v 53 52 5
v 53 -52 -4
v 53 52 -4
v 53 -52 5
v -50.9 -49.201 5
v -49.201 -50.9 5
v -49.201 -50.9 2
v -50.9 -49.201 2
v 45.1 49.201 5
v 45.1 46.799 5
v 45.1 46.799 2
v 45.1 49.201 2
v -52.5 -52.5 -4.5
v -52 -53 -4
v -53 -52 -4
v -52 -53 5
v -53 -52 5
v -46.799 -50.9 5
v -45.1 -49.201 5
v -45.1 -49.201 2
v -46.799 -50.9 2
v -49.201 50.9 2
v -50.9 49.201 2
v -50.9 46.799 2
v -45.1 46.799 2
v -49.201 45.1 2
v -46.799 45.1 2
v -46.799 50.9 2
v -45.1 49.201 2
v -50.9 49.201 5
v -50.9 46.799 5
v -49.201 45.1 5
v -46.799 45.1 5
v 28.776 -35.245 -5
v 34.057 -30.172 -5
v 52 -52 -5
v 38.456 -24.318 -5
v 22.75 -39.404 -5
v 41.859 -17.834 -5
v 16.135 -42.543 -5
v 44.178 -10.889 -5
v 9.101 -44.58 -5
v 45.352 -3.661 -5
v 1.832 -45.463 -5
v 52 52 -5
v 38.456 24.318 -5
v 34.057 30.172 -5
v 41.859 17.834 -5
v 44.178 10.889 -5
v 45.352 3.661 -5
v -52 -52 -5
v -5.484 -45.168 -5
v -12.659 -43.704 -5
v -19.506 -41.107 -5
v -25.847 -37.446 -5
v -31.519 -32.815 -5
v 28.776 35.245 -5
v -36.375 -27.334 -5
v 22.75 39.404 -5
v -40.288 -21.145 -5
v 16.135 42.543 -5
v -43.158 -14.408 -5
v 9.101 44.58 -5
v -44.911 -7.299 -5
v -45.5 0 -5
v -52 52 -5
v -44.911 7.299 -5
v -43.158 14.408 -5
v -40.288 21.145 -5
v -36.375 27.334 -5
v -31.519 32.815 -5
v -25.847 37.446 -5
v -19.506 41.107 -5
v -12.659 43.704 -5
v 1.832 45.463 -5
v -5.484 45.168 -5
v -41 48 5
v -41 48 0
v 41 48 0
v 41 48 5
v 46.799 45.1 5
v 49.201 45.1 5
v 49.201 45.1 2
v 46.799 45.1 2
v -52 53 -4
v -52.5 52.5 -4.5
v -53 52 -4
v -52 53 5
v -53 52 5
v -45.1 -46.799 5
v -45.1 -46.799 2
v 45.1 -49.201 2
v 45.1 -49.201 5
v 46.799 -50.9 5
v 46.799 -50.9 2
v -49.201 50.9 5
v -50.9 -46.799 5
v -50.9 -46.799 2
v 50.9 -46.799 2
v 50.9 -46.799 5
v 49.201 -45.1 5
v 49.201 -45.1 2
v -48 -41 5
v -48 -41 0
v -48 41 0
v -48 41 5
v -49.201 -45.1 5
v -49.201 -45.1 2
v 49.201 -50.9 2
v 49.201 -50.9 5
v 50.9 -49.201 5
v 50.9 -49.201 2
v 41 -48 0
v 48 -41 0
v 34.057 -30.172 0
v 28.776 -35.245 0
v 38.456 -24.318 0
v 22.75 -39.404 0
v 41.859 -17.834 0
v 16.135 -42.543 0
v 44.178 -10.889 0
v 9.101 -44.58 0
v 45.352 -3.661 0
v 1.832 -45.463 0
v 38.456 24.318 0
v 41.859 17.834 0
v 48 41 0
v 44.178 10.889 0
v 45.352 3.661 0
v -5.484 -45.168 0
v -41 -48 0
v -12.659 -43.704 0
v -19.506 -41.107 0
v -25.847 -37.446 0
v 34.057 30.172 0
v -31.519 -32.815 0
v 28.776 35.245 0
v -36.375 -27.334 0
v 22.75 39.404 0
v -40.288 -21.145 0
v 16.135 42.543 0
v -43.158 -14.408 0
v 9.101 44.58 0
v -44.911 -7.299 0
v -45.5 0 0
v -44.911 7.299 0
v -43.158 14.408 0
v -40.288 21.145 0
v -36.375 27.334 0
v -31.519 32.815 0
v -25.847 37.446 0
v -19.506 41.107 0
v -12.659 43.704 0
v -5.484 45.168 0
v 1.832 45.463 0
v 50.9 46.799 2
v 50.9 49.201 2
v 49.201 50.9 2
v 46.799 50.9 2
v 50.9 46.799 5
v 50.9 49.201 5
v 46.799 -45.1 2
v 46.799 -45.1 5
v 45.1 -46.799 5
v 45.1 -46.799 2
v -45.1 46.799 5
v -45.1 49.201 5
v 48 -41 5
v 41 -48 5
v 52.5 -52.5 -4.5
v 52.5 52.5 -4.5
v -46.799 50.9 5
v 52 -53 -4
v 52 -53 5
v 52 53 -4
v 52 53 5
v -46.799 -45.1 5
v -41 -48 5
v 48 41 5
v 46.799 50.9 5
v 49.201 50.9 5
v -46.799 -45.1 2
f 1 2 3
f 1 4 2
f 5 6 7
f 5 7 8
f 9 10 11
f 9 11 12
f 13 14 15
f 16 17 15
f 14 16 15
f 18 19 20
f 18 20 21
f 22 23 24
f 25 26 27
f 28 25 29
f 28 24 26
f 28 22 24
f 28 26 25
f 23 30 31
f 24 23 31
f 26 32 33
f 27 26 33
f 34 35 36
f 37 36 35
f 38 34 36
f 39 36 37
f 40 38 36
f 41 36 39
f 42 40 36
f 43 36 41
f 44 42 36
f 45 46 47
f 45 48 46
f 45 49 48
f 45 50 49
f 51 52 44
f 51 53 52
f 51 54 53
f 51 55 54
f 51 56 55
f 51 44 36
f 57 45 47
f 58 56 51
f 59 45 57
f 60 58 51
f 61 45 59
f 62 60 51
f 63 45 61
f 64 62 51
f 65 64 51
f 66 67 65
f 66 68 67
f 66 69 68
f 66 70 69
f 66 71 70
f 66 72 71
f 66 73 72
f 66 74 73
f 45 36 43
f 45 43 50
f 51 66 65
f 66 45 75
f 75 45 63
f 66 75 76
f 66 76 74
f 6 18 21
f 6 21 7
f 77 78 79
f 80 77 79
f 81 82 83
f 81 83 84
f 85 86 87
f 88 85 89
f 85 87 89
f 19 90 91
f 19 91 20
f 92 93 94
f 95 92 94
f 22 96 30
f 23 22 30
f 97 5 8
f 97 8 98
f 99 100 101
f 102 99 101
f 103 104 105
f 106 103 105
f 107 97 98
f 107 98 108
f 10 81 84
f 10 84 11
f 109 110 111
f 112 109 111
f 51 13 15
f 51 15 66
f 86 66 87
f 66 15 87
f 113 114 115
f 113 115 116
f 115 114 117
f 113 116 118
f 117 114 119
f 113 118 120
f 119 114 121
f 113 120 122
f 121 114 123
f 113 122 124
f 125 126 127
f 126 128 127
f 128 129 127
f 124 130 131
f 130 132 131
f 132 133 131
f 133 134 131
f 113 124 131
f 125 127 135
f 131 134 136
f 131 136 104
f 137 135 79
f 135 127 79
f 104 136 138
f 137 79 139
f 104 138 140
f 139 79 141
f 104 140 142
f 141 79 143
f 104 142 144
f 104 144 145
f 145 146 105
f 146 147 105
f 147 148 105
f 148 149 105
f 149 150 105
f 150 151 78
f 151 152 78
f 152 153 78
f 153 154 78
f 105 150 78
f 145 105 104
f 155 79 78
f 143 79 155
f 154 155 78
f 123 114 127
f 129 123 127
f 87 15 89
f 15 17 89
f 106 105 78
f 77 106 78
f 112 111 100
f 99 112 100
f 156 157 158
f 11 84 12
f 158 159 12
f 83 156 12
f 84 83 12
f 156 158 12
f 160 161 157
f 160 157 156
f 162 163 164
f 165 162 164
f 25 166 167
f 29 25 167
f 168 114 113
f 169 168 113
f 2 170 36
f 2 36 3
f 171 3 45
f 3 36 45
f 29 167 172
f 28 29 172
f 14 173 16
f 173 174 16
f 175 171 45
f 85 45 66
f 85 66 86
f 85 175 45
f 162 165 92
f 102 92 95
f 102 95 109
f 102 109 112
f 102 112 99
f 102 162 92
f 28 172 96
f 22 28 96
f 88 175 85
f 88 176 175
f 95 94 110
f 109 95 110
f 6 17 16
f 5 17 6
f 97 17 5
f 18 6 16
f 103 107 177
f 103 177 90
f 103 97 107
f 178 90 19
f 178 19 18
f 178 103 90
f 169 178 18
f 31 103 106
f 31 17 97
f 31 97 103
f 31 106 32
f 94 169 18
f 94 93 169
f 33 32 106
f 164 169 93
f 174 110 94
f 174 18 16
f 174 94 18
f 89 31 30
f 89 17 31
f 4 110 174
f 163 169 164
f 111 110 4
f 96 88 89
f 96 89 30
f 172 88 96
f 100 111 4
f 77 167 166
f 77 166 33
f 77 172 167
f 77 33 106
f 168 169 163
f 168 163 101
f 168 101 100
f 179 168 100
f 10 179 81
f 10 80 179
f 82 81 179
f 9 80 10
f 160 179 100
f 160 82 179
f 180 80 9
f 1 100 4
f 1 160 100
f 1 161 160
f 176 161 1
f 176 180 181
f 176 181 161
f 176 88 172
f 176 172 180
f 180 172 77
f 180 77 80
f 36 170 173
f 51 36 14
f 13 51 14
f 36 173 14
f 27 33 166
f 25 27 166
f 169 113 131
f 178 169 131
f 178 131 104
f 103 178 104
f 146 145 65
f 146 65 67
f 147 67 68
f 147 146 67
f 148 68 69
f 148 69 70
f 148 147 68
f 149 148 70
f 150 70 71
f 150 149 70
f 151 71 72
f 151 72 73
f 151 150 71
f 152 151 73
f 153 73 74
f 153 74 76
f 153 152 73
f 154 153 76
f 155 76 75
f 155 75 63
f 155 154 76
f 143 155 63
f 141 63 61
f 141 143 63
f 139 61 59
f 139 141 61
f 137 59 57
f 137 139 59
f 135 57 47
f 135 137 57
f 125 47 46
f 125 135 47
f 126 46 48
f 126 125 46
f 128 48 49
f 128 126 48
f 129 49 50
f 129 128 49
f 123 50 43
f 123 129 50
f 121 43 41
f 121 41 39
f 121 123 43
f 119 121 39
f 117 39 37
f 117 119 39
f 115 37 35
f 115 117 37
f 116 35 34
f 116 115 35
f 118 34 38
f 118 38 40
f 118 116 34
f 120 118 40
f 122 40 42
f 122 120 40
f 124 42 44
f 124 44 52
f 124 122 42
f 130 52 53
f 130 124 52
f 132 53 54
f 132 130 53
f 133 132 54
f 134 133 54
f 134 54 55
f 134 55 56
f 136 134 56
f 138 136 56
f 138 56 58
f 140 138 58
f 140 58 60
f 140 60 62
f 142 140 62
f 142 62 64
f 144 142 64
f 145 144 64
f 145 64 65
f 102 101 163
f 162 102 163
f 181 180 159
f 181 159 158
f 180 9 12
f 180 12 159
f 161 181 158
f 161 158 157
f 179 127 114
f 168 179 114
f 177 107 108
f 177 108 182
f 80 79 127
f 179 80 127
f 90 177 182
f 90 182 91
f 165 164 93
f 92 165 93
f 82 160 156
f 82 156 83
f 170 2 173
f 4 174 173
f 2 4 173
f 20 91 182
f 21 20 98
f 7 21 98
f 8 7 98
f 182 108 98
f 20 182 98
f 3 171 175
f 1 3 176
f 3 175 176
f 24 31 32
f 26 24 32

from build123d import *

# Parameters (mm, degrees)
SKETCH1_LARGER_DIA_W  = 106
SKETCH1_LARGER_DIA_H  = 106
BOSS_EXTRUDE1_DEPTH   = 5
SKETCH5_SMALLER_DIA_W = 106
SKETCH5_SMALLER_DIA_H = 106
SKETCH5_SMALLER_DIA_R = 45.5
BOSS_EXTRUDE2_DEPTH   = 5
CUT_EXTRUDE1_DEPTH    = 3
CHAMFER2_SIZE         = 1
CHAMFER3_SIZE         = 1


with BuildPart() as part:
    # Sketch1 larger dia → Boss-Extrude1 (new body)
    with BuildSketch(Plane.XY):
        Rectangle(SKETCH1_LARGER_DIA_W, SKETCH1_LARGER_DIA_H)
        Polygon((-41, 48), (41, 48), (48, 41), (48, -41), (41, -48), (-41, -48), (-48, -41), (-48, 41), align=None, mode=Mode.SUBTRACT)
    extrude(amount=BOSS_EXTRUDE1_DEPTH)

    # Sketch5 smaller dia → Boss-Extrude2 (add)
    with BuildSketch(Plane(origin=(0, 0, 0), x_dir=(-1, 0, 0), z_dir=(0, 0, -1))):
        Rectangle(SKETCH5_SMALLER_DIA_W, SKETCH5_SMALLER_DIA_H)
        Circle(SKETCH5_SMALLER_DIA_R, mode=Mode.SUBTRACT)
    extrude(amount=BOSS_EXTRUDE2_DEPTH)

    # Sketch1 → Cut-Extrude1 (cut)
    with BuildSketch(Plane.XY.offset(5)):
        Polygon((-45.1, 46.798780669), (-45.1, 49.201219331), (-46.798780669, 50.9), (-49.201219331, 50.9), (-50.9, 49.201219331), (-50.9, 46.798780669), (-49.201219331, 45.1), (-46.798780669, 45.1), align=None)
        Polygon((-46.798780669, -45.1), (-45.1, -46.798780669), (-45.1, -49.201219331), (-46.798780669, -50.9), (-49.201219331, -50.9), (-50.9, -49.201219331), (-50.9, -46.798780669), (-49.201219331, -45.1), align=None)
        Polygon((46.798780669, 45.1), (45.1, 46.798780669), (45.1, 49.201219331), (46.798780669, 50.9), (49.201219331, 50.9), (50.9, 49.201219331), (50.9, 46.798780669), (49.201219331, 45.1), align=None)
        Polygon((45.1, -46.798780669), (45.1, -49.201219331), (46.798780669, -50.9), (49.201219331, -50.9), (50.9, -49.201219331), (50.9, -46.798780669), (49.201219331, -45.1), (46.798780669, -45.1), align=None)
    extrude(amount=-CUT_EXTRUDE1_DEPTH, mode=Mode.SUBTRACT)

    # Chamfer2
    chamfer2_edges = [part.edges().sort_by_distance(p)[0] for p in [
        (53, 0, -5),
        (0, -53, -5),
        (-53, 0, -5),
        (0, 53, -5),
    ]]
    chamfer(chamfer2_edges, length=CHAMFER2_SIZE)

    # Chamfer3
    chamfer3_edges = [part.edges().sort_by_distance(p)[0] for p in [
        (-53, 53, 0.5),
        (53, 53, 0.5),
        (53, -53, 0.5),
        (-53, -53, 0.5),
    ]]
    chamfer(chamfer3_edges, length=CHAMFER3_SIZE)


solid = part.part
